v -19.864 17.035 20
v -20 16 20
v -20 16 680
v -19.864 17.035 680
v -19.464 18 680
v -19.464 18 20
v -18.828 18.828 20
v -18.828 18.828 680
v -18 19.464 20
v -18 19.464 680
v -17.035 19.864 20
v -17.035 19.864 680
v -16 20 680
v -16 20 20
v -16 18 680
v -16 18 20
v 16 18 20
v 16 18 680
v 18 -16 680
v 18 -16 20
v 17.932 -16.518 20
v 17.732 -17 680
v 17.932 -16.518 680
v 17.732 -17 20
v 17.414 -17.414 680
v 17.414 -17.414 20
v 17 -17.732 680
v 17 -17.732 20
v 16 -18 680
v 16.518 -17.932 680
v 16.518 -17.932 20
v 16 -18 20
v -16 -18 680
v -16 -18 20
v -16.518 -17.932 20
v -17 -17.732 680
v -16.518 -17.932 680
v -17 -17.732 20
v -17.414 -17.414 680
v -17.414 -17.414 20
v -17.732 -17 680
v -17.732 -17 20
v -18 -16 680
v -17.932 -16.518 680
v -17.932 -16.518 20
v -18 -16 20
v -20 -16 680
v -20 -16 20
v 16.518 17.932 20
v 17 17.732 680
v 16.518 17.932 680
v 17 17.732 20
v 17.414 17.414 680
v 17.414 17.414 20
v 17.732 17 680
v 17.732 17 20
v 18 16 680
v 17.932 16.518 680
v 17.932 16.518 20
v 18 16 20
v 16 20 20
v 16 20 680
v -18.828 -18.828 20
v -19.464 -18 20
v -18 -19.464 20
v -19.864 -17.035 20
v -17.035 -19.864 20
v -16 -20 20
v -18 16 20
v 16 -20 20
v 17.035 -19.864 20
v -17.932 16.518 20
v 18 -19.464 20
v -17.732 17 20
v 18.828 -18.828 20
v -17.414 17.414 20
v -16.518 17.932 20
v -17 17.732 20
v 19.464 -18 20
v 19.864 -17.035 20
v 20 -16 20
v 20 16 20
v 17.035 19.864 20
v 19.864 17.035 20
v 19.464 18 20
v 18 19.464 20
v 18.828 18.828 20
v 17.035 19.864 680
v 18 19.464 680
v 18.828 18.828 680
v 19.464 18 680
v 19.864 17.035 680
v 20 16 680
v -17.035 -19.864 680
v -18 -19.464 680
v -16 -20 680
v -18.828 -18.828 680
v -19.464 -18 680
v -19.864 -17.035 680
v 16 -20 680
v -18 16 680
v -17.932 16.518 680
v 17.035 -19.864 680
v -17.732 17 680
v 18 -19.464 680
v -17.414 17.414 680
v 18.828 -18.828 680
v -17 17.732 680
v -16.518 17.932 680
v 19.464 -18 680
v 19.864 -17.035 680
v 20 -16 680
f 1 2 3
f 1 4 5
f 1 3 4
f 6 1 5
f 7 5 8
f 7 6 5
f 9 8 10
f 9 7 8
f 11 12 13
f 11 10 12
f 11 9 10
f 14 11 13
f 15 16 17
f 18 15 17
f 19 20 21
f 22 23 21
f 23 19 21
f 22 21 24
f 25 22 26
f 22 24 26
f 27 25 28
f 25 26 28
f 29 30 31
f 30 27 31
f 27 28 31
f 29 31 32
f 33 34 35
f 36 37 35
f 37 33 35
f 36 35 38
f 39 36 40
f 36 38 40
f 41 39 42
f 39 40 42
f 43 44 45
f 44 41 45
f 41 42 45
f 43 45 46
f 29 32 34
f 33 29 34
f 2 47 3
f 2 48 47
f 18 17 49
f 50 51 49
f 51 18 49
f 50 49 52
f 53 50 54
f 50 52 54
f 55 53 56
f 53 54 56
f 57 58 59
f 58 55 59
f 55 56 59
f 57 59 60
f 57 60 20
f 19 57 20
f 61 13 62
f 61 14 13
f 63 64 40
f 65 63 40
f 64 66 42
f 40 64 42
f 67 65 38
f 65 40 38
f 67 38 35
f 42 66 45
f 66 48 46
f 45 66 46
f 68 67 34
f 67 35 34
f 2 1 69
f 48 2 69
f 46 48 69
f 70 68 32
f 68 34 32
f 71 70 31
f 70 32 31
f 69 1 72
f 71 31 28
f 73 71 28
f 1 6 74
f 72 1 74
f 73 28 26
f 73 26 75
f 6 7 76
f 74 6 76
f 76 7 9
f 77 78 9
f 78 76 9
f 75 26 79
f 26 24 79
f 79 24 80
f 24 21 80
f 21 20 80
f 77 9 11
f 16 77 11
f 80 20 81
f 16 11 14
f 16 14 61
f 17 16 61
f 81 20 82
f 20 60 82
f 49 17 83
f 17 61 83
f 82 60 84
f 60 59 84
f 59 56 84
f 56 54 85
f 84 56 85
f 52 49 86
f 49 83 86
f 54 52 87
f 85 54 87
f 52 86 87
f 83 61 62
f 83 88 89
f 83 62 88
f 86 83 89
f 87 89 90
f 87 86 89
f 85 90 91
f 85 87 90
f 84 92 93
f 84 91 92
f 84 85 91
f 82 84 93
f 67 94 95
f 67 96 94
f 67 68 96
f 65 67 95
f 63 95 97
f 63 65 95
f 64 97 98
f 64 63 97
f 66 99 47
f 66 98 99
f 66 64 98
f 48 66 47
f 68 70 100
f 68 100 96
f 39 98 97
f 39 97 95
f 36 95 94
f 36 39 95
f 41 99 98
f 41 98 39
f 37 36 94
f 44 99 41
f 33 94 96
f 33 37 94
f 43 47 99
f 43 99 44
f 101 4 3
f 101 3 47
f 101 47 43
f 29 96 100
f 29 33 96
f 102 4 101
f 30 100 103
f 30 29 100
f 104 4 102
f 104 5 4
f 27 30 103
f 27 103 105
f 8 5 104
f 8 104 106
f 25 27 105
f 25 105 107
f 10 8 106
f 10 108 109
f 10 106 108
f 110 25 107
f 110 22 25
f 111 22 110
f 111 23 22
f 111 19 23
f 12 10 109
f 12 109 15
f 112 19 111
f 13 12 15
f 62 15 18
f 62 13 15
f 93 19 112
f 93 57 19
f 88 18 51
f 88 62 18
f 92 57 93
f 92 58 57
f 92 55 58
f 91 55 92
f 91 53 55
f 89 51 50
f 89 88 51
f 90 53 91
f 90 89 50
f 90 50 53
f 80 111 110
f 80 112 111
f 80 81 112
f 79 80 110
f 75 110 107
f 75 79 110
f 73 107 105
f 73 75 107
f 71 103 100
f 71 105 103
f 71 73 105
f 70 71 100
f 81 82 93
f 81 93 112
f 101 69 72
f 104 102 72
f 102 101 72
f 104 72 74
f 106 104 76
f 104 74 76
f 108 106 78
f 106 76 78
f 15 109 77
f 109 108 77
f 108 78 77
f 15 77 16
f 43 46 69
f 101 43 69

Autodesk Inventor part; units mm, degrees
ref_plane "YZ Plane" through (0, 0, 0) normal (1, 0, 0) x (0, 1, 0)
ref_plane "Start Plane" through (0, 0, 20) normal (0, 0, 1) x (1, 0, 0)
ref_plane "End Plane" through (0, 0, 680) normal (0, 0, 1) x (1, 0, 0)
sketch "Sketch" plane through (0, 0, 0) normal (0, 0, 1) x (1, 0, 0)
  line L0 (-20, -16) -> (-20, 16)
  line L1 (-16, 20) -> (16, 20)
  line L2 (20, 16) -> (20, -16)
  line L3 (16, -20) -> (-16, -20)
  arc A0 (-20, -16) -> (-16, -20) centre (-16, -16) ccw
  arc A1 (20, 16) -> (16, 20) centre (16, 16) ccw
  arc A2 (-16, 20) -> (-20, 16) centre (-16, 16) ccw
  arc A3 (16, -20) -> (20, -16) centre (16, -16) ccw
  arc A4 (-16, 18) -> (-18, 16) centre (-16, 16) ccw
  line L4 (-16, 18) -> (16, 18)
  arc A5 (18, 16) -> (16, 18) centre (16, 16) ccw
  line L5 (18, 16) -> (18, -16)
  arc A6 (16, -18) -> (18, -16) centre (16, -16) ccw
  line L6 (16, -18) -> (-16, -18)
  arc A7 (-18, -16) -> (-16, -18) centre (-16, -16) ccw
  line L7 (-18, -16) -> (-18, 16)
  line L8 (0, 29.1598) -> (0, -29.1598) construction
  line L9 (-29.1598, 0) -> (29.1598, 0) construction
  dimension "d7" = 4
  dimension "d9" = 40
  dimension "d11" = 40
  dimension "d12" = 2
  dimension "d15" = 20
  dimension "d16" = 20
extrude "Body" add sketch "Sketch" along normal up to surface (660 mm away) from surface at 20
sketch "Sketch3" plane through (0, 0, 0) normal (0, 0, 1) x (1, 0, 0)
  line L0 (0, 0) -> (10, 0)
ref_plane "Work Plane3" through (0, 0, 0) normal (0, -1, 0) x (1, 0, 0)
sketch "Sketch4" plane through (0, 0, 0) normal (0, -1, 0) x (1, 0, 0)
  line L0 (-2, 20) -> (12, 20) projected
  line L1 (-2, 680) -> (12, 680) projected
  dimension "d18" = 660
equation "\"d7\" = G_IR"
equation "\"d9\" = G_W"
equation "\"d11\" = G_H"
equation "\"d12\" = G_T"
equation "\"d15\" = 0.5 * d9"
equation "\"d16\" = 0.5 * d11"
equation "\"d3\" = G_L"
equation "\"G_W\" = 40"
equation "\"G_H\" = 40"
equation "\"G_T\" = 2"
equation "\"G_IR\" = 4"
equation "\"G_L\" = d18"
properties part number "ISO 10799-2 - 40x40x2 - 660" material "Steel, Mild"
